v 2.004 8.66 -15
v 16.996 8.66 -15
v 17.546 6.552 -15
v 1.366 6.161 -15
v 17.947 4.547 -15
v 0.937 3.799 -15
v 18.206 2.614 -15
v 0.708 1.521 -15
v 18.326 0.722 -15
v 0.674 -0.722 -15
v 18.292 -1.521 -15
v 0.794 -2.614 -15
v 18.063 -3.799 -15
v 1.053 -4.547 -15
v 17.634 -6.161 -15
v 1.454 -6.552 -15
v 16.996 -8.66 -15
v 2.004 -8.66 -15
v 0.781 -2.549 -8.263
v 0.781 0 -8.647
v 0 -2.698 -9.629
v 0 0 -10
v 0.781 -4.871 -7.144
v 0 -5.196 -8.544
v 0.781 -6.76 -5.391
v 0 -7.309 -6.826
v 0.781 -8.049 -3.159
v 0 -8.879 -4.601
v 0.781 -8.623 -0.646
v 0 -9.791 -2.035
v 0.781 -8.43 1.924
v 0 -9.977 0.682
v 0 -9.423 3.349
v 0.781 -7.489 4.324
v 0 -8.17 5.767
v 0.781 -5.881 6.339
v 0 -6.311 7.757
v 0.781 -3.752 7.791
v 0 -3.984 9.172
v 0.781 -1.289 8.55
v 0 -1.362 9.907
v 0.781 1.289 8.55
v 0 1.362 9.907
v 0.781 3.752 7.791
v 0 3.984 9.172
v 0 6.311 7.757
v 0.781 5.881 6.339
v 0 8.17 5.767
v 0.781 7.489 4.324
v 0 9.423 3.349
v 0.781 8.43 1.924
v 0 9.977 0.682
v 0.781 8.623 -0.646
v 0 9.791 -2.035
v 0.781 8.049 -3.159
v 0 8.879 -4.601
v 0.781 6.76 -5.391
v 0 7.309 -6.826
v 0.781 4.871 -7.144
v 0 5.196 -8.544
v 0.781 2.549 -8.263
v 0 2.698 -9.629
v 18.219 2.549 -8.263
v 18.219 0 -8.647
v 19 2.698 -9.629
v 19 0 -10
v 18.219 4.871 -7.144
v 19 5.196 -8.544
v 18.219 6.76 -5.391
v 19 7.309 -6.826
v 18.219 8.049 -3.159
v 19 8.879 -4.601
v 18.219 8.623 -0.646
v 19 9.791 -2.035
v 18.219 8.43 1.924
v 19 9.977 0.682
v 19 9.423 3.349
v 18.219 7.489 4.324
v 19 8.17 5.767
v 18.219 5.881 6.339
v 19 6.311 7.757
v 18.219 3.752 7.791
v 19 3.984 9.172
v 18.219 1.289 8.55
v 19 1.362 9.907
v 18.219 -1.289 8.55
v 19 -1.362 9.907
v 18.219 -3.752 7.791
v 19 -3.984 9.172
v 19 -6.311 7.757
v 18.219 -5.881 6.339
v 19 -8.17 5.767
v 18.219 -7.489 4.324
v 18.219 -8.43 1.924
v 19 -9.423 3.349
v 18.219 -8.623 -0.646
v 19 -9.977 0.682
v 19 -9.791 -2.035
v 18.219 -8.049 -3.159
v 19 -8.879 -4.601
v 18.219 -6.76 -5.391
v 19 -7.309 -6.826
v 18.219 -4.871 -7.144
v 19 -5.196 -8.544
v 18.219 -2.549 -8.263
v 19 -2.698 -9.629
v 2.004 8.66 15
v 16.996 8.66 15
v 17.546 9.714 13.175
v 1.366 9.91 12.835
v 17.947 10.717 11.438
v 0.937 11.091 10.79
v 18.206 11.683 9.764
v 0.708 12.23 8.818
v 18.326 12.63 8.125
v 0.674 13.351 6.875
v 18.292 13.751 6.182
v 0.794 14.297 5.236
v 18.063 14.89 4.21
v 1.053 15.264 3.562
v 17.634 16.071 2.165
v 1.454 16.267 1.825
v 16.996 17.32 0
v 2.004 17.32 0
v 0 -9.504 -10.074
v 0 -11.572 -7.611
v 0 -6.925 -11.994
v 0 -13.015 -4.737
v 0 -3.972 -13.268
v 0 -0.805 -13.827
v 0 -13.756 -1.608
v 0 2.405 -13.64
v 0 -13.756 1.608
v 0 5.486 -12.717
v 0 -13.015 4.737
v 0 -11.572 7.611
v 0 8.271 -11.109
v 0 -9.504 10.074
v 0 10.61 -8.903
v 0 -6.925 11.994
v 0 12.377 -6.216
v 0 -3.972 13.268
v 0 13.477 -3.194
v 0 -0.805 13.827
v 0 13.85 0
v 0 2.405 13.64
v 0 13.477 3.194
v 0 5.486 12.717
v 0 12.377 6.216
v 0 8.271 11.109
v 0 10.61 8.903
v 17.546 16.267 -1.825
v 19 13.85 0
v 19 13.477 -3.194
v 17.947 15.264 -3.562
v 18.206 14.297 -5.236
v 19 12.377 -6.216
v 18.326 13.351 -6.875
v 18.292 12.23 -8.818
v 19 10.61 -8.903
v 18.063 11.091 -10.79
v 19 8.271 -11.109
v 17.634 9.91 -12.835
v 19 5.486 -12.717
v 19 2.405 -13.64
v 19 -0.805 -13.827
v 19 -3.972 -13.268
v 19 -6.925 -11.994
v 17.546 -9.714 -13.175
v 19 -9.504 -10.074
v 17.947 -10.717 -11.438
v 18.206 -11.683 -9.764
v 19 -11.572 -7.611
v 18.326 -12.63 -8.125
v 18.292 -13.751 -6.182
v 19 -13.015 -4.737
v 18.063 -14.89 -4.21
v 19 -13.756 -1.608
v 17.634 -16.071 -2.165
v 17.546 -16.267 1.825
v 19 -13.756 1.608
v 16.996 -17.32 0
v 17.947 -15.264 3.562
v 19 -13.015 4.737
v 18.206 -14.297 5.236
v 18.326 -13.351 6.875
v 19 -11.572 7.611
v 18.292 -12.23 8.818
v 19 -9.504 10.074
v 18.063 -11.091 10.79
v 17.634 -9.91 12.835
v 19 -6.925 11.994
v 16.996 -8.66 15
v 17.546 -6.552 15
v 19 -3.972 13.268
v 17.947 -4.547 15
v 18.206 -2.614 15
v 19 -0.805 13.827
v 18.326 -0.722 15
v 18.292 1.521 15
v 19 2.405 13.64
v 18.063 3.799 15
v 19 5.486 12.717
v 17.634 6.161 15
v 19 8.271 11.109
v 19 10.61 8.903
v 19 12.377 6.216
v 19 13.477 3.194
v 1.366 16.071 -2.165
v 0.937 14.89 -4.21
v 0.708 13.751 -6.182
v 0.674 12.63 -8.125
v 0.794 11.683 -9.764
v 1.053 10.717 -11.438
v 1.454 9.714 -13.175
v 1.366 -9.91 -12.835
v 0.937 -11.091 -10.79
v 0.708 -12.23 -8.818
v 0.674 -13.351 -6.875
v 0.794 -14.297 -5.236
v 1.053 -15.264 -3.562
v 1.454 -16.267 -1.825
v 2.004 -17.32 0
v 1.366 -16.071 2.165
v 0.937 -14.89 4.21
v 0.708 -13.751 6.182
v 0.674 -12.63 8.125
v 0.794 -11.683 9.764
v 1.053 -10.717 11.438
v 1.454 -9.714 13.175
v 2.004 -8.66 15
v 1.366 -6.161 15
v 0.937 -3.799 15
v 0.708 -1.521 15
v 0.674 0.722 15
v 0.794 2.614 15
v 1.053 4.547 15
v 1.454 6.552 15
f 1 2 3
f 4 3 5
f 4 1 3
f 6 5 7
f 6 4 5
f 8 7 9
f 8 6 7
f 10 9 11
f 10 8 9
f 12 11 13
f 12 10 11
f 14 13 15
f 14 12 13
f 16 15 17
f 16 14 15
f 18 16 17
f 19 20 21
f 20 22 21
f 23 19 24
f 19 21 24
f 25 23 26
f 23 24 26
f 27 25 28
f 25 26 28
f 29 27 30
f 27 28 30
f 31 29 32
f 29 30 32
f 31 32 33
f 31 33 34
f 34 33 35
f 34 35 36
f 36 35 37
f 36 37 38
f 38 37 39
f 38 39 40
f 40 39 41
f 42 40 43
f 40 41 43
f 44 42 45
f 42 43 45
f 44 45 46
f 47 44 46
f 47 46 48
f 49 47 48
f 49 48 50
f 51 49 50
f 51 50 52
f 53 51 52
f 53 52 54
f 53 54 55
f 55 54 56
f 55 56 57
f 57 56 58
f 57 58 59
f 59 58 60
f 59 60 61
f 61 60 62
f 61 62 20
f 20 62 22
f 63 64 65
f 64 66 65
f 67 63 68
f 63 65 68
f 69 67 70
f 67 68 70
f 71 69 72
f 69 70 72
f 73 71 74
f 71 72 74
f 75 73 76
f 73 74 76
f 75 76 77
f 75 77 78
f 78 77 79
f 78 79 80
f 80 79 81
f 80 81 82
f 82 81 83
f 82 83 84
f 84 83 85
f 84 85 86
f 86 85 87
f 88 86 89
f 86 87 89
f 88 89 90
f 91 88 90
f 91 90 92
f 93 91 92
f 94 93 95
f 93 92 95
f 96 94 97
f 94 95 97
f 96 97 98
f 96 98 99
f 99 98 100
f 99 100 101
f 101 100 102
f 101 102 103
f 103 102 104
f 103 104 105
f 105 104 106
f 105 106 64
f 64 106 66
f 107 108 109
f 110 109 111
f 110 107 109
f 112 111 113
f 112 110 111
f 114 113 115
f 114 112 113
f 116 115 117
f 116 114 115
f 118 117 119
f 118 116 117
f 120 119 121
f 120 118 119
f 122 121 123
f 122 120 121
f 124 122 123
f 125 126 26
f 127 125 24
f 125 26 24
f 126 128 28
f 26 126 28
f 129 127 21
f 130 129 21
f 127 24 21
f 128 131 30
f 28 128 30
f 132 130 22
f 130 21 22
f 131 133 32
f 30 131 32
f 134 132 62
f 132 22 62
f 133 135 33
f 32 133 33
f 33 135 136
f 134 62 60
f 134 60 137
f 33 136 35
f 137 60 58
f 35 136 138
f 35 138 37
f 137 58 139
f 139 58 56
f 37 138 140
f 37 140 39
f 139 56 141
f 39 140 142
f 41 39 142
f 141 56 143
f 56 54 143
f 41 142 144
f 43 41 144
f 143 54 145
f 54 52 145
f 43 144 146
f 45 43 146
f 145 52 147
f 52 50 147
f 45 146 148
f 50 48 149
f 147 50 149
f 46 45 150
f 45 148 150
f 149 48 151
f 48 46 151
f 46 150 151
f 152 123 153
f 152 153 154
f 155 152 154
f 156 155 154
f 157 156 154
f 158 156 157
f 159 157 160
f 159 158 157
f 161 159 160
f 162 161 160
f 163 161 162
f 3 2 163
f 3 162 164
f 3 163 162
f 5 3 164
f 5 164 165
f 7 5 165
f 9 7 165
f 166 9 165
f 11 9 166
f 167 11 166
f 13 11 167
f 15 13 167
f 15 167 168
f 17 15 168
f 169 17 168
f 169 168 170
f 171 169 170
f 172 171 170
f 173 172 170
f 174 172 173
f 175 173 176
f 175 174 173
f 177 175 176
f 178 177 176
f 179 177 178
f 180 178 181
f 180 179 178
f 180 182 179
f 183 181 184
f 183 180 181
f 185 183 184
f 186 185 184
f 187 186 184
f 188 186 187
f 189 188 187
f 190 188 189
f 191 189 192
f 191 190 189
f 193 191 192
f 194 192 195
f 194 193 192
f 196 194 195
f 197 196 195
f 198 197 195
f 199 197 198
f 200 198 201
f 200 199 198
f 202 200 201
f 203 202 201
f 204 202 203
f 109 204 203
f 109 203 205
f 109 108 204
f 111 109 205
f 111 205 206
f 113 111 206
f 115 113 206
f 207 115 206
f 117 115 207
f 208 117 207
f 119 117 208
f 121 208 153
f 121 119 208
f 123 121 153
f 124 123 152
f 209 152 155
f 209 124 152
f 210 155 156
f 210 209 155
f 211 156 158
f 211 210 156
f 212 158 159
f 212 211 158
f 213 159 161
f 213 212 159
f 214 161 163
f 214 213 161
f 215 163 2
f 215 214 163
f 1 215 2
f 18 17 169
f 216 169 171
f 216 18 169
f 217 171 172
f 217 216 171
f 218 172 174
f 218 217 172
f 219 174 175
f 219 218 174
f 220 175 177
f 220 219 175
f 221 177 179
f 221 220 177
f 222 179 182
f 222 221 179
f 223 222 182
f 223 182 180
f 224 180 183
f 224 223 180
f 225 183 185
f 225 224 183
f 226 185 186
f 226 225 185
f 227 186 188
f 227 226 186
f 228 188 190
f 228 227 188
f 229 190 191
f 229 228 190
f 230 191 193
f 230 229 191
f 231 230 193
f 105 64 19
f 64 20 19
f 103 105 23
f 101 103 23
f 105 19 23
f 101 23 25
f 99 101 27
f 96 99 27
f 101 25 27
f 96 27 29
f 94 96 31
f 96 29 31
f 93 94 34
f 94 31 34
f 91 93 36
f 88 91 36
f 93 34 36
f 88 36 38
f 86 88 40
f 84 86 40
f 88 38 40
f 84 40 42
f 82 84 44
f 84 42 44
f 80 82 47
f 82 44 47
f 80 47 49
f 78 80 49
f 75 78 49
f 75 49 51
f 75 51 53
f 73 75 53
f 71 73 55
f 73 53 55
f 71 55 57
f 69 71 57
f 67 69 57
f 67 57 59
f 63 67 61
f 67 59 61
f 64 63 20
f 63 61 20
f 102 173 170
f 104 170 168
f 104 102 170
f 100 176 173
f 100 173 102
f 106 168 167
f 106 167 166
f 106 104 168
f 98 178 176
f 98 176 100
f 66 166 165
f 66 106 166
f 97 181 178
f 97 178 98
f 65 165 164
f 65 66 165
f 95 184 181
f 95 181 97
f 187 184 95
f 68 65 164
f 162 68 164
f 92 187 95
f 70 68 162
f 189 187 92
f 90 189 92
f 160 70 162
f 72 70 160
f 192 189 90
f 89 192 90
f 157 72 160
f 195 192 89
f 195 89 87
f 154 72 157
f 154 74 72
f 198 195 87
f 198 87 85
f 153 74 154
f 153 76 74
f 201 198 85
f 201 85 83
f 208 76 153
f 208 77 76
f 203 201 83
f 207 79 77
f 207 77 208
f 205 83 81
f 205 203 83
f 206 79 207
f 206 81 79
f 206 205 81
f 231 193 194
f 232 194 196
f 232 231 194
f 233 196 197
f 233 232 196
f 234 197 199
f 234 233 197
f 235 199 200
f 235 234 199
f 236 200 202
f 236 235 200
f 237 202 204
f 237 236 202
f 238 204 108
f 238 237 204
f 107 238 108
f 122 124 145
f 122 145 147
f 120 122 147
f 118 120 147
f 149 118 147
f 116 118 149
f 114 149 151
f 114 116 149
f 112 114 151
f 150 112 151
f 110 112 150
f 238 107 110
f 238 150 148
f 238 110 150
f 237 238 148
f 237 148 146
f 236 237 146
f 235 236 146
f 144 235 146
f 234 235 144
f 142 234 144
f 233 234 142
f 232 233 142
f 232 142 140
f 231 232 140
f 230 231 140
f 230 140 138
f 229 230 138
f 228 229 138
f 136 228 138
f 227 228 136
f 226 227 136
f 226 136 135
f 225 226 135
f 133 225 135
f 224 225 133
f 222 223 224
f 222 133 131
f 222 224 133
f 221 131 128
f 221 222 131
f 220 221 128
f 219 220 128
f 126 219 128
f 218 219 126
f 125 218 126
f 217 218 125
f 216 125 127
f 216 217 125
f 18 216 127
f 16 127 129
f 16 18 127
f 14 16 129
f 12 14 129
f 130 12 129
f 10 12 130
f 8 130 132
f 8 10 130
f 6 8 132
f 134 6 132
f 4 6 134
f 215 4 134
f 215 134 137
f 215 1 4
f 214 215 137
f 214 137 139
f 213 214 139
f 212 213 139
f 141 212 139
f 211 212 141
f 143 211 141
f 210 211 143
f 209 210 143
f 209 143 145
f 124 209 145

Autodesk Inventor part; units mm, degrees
ref_plane "YZ Plane" through (0, 0, 0) normal (1, 0, 0) x (0, 1, 0)
ref_plane "XZ Plane" through (0, 0, 0) normal (0, 1, 0) x (-1, 0, 0)
sketch "Sketch1" plane through (0, 0, 0) normal (1, 0, 0) x (0, 1, 0)
  line L0 (-17.3205, 0) -> (-8.6603, 15)
  line L1 (-8.6603, 15) -> (8.6603, 15)
  line L2 (8.6603, 15) -> (17.3205, 0)
  line L3 (17.3205, 0) -> (8.6603, -15)
  line L4 (8.6603, -15) -> (-8.6603, -15)
  line L5 (-8.6603, -15) -> (-17.3205, 0)
  point P0 (0, 0)
  point P1 (0, 0)
  dimension "d0" = 34.641
extrude "Body" add sketch "Sketch1" along normal blind 19
sketch "Sketch2" plane through (0, 0, 0) normal (0, 0, 1) x (1, 0, 0)
  line L0 (0, 8.6603) -> (0, 17.3205) projected
  line L1 (0, 17.3205) -> (19, 17.3205) projected
  line L2 (19, 8.6603) -> (19, 17.3205) projected
  line L3 (-3.8, 0) -> (22.8, 0) projected
  line L4 (2.0037, 17.3205) -> (0, 13.85)
  line L5 (16.9963, 17.3205) -> (19, 13.85)
  dimension "d3" = 30
  dimension "d4" = 30
  dimension "d5" = 27.7
  dimension "d6" = 27.7
revolve "Chamfer1" cut sketch "Sketch2" angle 360 about axis through (-10, 0, 0) along (1, 0, 0)
sketch "Sketch3" plane through (19, 0, 0) normal (1, 0, 0) x (0, 0, -1)
  arc A0 (-0.625, -1.0825) -> (0.625, -1.0825) centre (0, 0) ccw projected
hole "Thread" at (19, 0, 0) direction (-1, 0, 0) diameter 17.294 end through all thread size "M20x2.5" class "6H" standard "ISO Metric profile"
chamfer "Chamfer2" distance 1.3532 angle 30 1 edges at (19, 0, 8.647) measured on face at (19, 11.9605, -1.4523)
chamfer "Chamfer3" distance 1.3532 angle 30 1 edges at (0, 0, 8.647) measured on face at (0, 11.9605, -1.4523)
ref_plane "Work Plane1" through (-30.997, 0, 0) normal (0, -0.8660254, -0.5) x (1, 0, 0)
equation "\"d0\" = 1.1547 * SW"
equation "\"d1\" = KOH"
equation "\"d3\" = ANG1"
equation "\"d4\" = ANG2"
equation "\"d5\" = SW0"
equation "\"d6\" = SW01"
equation "\"d8\" = -0.5 * GD1 + 0.5 * NND"
equation "\"d40\" = -0.5 * GD1 + 0.5 * NND"
equation "\"d10\" = -0.5 * GD1 + 0.5 * NND"
equation "\"d41\" = -0.5 * GD1 + 0.5 * NND"
equation "\"ANG1\" = 30deg"
equation "\"ANG2\" = 30deg"
equation "\"KOH\" = 19"
equation "\"SW0\" = 27.7"
equation "\"SW01\" = SW0"
equation "\"GUL\" = 0.541266 * PTC"
equation "\"TOA\" = 30deg"
equation "\"PTC\" = 2.5"
equation "\"E0\" = 1.155 * SW"
equation "\"GAL\" = 0.541266 * PTC"
equation "\"SW\" = 30"
equation "\"GD1\" = 17.293671"
equation "\"NND\" = 20"
properties part number "ISO 4034 - M20" material "Steel"
